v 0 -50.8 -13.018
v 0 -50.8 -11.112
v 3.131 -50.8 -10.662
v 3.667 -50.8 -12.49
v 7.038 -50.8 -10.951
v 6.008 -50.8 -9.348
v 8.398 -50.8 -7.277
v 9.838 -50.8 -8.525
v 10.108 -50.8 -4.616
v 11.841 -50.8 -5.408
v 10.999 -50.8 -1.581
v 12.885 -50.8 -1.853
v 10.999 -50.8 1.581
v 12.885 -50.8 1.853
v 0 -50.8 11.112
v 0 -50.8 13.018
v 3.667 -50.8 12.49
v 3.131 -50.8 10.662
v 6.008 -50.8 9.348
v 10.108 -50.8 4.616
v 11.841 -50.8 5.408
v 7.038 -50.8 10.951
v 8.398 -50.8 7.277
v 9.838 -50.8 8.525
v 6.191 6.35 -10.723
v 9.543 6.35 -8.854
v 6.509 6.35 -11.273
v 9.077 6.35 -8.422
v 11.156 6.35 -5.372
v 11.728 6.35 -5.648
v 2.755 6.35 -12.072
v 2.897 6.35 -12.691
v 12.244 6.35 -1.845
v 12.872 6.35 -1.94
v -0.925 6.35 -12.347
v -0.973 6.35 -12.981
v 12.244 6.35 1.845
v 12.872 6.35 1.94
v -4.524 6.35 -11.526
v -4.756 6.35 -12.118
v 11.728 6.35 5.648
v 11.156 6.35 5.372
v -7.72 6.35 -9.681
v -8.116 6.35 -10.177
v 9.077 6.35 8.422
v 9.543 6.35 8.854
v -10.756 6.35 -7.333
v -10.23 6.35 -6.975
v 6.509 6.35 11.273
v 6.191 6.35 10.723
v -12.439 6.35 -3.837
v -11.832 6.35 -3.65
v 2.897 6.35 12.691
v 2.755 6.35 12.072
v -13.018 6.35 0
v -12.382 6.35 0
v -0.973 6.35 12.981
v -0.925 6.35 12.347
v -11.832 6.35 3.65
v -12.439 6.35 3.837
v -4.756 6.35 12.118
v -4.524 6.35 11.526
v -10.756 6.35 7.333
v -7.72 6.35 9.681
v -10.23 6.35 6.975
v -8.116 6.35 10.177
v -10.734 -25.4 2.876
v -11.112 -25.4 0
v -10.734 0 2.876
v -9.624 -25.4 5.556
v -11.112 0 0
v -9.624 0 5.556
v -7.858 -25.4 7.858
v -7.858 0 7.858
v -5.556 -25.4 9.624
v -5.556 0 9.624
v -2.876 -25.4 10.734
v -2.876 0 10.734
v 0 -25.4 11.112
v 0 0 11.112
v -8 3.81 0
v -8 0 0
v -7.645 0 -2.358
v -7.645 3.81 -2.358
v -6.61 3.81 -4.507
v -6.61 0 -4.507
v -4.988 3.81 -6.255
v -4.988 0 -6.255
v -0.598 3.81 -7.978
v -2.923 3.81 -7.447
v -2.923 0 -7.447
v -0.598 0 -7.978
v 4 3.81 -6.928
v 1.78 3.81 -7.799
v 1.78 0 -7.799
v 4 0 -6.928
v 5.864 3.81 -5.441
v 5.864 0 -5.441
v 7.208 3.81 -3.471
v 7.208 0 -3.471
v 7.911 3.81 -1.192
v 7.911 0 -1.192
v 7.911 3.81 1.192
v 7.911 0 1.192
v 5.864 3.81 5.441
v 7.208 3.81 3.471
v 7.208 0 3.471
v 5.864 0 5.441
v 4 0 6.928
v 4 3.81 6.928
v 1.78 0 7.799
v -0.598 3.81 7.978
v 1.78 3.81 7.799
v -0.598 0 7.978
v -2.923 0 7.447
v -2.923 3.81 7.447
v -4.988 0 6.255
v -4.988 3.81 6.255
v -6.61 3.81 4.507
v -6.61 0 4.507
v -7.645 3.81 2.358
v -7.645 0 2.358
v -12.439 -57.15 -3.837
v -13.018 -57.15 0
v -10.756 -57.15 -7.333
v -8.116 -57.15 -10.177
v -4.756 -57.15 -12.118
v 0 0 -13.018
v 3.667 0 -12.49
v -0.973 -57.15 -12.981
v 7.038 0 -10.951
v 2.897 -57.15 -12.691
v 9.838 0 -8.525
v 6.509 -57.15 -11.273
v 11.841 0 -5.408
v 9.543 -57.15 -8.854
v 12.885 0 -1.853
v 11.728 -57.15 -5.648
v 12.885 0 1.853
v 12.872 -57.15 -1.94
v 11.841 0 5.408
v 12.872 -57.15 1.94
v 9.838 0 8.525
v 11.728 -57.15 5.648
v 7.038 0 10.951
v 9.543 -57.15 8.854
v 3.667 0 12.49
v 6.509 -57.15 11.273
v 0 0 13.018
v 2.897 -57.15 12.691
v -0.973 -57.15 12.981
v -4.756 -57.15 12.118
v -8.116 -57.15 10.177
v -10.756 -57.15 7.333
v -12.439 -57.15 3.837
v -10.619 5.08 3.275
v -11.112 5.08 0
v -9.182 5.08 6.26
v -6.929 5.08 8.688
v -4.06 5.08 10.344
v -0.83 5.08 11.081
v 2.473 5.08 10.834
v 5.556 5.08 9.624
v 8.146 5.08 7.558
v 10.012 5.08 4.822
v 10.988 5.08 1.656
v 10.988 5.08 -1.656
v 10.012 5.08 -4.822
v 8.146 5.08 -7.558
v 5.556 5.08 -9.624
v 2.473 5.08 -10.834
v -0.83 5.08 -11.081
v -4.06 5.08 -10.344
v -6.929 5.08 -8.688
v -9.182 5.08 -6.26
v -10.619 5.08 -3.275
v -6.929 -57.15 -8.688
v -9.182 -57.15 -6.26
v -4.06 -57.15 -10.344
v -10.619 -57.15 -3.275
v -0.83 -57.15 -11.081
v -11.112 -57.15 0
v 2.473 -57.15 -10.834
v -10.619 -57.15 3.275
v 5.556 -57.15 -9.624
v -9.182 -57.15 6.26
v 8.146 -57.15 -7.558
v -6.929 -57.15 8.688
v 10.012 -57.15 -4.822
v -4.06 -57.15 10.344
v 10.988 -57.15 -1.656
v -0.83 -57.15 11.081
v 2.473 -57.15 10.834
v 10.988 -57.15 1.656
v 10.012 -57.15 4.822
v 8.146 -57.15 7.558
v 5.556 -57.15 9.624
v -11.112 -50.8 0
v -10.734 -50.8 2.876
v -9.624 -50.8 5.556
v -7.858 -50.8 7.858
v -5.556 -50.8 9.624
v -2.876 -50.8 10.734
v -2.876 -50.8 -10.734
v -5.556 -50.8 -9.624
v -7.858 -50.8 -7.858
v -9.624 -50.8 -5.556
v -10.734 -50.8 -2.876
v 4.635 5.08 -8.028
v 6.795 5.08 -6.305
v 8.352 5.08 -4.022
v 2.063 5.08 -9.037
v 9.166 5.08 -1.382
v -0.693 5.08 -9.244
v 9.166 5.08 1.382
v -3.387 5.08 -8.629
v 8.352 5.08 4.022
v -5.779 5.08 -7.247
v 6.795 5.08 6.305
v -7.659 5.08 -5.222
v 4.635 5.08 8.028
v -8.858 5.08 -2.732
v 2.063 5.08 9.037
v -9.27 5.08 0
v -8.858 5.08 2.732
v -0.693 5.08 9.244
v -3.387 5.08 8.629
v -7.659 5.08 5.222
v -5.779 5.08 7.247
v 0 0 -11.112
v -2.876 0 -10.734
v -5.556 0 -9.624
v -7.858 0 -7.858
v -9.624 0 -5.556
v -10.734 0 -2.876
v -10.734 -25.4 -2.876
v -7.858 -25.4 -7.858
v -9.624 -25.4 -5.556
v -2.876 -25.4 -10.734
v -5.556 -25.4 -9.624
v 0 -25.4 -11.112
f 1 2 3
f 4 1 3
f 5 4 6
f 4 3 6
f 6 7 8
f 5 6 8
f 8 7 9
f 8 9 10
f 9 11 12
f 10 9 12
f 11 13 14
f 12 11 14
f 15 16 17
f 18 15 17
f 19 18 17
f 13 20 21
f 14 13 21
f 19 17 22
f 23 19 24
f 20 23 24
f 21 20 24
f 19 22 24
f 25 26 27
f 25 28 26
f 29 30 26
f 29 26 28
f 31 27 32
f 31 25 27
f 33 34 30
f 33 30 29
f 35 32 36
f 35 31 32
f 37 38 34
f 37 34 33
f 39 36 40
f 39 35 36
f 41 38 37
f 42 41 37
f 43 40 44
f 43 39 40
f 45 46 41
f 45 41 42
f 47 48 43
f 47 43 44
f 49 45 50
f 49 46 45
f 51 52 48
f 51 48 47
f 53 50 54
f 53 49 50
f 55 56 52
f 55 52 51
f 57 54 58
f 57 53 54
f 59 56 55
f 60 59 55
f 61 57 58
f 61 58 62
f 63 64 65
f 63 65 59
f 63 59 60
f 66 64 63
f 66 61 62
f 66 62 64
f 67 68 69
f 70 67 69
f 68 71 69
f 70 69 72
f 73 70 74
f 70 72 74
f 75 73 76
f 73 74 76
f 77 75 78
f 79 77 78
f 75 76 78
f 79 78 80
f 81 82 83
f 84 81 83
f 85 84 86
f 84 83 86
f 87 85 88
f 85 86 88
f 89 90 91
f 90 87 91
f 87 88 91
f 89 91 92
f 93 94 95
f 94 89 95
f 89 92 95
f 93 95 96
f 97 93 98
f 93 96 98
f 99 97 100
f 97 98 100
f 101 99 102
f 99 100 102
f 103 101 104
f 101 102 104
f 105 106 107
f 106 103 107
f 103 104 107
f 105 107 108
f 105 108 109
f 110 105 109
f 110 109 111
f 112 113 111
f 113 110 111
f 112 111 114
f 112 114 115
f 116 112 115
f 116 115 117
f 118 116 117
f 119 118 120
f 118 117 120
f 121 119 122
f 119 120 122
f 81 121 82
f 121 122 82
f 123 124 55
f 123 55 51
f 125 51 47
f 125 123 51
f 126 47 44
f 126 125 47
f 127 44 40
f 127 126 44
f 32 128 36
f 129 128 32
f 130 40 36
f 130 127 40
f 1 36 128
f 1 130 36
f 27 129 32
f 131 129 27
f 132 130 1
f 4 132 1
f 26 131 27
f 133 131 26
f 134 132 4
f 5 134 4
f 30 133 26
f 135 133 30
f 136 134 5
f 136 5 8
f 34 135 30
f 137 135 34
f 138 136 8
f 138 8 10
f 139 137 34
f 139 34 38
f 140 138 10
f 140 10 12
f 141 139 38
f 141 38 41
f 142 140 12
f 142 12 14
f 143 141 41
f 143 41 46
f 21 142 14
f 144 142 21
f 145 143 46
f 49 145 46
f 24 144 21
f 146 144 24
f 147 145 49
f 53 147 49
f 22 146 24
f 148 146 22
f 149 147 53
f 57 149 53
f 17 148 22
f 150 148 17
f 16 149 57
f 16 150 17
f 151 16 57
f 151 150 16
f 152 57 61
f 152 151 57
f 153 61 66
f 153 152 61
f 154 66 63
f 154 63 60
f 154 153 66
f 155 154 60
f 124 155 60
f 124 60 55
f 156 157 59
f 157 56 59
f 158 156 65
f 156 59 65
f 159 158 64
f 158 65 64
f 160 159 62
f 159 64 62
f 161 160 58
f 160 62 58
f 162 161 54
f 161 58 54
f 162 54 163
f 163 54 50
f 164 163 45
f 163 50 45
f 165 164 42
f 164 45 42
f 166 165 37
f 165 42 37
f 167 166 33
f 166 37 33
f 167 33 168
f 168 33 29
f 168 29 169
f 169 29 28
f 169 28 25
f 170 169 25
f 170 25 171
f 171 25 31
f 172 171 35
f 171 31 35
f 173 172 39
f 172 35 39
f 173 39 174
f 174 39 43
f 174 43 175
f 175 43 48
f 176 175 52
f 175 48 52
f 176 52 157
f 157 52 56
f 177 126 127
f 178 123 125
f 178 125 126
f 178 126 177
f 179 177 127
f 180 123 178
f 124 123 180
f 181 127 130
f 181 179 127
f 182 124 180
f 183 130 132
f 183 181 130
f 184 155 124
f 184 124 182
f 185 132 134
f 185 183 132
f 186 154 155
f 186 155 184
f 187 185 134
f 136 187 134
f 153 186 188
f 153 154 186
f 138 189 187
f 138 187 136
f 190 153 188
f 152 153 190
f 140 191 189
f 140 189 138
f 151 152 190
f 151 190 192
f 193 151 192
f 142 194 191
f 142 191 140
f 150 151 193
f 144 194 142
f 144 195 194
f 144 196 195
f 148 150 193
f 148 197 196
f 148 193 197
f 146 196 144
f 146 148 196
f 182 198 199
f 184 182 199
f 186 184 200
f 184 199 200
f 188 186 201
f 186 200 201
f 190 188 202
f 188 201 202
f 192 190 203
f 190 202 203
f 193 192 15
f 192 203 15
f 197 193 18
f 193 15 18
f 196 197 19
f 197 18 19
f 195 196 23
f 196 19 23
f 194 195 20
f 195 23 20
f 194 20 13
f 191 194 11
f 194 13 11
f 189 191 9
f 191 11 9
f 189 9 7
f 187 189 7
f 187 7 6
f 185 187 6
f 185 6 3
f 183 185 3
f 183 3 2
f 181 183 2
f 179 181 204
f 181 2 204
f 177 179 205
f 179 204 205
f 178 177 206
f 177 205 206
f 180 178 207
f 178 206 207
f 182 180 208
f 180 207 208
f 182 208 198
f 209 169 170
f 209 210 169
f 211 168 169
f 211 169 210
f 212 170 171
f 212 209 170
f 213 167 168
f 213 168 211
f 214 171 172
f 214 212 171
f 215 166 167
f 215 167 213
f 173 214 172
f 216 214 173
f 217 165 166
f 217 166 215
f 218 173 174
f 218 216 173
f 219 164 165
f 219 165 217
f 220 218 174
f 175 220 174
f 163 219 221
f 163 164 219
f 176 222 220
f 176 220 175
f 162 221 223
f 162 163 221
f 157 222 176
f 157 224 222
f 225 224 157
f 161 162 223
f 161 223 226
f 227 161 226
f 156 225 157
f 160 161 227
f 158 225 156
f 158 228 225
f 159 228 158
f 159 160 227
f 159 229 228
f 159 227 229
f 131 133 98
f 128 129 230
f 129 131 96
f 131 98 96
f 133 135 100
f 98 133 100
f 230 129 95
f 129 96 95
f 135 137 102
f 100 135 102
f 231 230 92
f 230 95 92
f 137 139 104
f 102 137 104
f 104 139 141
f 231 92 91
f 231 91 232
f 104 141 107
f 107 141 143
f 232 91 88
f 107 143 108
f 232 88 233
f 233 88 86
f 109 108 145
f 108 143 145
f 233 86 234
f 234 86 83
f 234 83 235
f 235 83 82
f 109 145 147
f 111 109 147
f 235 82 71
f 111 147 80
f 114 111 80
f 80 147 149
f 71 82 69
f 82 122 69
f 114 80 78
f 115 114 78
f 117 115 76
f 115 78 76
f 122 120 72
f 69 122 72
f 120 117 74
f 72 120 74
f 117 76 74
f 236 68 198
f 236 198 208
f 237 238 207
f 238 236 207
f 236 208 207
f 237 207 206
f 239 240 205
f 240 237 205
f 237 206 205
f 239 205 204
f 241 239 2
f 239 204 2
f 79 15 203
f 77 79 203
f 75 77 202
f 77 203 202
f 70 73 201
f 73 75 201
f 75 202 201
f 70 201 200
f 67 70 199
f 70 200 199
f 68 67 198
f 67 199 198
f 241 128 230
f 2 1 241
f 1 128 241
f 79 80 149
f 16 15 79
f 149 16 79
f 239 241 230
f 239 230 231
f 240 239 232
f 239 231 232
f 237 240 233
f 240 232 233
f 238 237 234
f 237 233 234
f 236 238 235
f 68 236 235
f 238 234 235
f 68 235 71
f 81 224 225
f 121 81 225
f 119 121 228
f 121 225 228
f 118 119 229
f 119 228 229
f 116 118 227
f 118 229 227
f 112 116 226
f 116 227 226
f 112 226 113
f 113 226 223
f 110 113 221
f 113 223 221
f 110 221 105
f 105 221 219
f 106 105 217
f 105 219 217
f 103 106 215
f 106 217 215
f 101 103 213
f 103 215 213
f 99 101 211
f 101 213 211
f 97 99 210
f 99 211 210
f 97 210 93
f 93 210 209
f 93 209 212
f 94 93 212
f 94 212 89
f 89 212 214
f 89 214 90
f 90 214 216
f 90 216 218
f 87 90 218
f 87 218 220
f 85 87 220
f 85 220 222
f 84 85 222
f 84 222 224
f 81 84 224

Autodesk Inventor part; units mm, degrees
ref_plane "YZ Plane" through (0, 0, 0) normal (1, 0, 0) x (0, 1, 0)
ref_plane "XZ Plane" through (0, 0, 0) normal (0, 1, 0) x (-1, 0, 0)
ref_plane "XY Plane" through (0, 0, 0) normal (0, 0, 1) x (1, 0, 0)
sketch "Sketch1" plane through (0, 0, 0) normal (0, 1, 0) x (-1, 0, 0)
  circle A0 centre (0, 0) radius 13.0175
  circle A1 centre (0, 0) radius 11.1125
  line L0 (0, 13.0175) -> (0, 11.1125)
  line L1 (0, -11.1125) -> (0, -13.0175)
  circle A2 centre (0, 0) radius 8
  dimension "d0" = 26.035
  dimension "d1" = 22.225
  dimension "d6" = 16
extrude "Extrusion1" add sketch "Sketch1" along normal blind 6.35 contours A0 L1 A1 L0 | L0 A1 L1 A0
extrude "Extrusion2" add sketch "Sketch1" against normal blind 25.4 contours A0 L1 A1 L0 picked at (12.2737, -0.9656)
mirror "Mirror1" about plane through (-6.5087, -25.4, 0) normal (0, -1, 0) of "Extrusion2", "Extrusion1"
extrude "Extrusion3" add sketch "Sketch1" along normal blind 5.08 contours A1
chamfer "Chamfer1" distance 1.27 angle 45 2 edges at (11.1125, 6.35, 0) (8, 5.08, 0)
properties part number "Electronics HousingV2_3DPrint"
